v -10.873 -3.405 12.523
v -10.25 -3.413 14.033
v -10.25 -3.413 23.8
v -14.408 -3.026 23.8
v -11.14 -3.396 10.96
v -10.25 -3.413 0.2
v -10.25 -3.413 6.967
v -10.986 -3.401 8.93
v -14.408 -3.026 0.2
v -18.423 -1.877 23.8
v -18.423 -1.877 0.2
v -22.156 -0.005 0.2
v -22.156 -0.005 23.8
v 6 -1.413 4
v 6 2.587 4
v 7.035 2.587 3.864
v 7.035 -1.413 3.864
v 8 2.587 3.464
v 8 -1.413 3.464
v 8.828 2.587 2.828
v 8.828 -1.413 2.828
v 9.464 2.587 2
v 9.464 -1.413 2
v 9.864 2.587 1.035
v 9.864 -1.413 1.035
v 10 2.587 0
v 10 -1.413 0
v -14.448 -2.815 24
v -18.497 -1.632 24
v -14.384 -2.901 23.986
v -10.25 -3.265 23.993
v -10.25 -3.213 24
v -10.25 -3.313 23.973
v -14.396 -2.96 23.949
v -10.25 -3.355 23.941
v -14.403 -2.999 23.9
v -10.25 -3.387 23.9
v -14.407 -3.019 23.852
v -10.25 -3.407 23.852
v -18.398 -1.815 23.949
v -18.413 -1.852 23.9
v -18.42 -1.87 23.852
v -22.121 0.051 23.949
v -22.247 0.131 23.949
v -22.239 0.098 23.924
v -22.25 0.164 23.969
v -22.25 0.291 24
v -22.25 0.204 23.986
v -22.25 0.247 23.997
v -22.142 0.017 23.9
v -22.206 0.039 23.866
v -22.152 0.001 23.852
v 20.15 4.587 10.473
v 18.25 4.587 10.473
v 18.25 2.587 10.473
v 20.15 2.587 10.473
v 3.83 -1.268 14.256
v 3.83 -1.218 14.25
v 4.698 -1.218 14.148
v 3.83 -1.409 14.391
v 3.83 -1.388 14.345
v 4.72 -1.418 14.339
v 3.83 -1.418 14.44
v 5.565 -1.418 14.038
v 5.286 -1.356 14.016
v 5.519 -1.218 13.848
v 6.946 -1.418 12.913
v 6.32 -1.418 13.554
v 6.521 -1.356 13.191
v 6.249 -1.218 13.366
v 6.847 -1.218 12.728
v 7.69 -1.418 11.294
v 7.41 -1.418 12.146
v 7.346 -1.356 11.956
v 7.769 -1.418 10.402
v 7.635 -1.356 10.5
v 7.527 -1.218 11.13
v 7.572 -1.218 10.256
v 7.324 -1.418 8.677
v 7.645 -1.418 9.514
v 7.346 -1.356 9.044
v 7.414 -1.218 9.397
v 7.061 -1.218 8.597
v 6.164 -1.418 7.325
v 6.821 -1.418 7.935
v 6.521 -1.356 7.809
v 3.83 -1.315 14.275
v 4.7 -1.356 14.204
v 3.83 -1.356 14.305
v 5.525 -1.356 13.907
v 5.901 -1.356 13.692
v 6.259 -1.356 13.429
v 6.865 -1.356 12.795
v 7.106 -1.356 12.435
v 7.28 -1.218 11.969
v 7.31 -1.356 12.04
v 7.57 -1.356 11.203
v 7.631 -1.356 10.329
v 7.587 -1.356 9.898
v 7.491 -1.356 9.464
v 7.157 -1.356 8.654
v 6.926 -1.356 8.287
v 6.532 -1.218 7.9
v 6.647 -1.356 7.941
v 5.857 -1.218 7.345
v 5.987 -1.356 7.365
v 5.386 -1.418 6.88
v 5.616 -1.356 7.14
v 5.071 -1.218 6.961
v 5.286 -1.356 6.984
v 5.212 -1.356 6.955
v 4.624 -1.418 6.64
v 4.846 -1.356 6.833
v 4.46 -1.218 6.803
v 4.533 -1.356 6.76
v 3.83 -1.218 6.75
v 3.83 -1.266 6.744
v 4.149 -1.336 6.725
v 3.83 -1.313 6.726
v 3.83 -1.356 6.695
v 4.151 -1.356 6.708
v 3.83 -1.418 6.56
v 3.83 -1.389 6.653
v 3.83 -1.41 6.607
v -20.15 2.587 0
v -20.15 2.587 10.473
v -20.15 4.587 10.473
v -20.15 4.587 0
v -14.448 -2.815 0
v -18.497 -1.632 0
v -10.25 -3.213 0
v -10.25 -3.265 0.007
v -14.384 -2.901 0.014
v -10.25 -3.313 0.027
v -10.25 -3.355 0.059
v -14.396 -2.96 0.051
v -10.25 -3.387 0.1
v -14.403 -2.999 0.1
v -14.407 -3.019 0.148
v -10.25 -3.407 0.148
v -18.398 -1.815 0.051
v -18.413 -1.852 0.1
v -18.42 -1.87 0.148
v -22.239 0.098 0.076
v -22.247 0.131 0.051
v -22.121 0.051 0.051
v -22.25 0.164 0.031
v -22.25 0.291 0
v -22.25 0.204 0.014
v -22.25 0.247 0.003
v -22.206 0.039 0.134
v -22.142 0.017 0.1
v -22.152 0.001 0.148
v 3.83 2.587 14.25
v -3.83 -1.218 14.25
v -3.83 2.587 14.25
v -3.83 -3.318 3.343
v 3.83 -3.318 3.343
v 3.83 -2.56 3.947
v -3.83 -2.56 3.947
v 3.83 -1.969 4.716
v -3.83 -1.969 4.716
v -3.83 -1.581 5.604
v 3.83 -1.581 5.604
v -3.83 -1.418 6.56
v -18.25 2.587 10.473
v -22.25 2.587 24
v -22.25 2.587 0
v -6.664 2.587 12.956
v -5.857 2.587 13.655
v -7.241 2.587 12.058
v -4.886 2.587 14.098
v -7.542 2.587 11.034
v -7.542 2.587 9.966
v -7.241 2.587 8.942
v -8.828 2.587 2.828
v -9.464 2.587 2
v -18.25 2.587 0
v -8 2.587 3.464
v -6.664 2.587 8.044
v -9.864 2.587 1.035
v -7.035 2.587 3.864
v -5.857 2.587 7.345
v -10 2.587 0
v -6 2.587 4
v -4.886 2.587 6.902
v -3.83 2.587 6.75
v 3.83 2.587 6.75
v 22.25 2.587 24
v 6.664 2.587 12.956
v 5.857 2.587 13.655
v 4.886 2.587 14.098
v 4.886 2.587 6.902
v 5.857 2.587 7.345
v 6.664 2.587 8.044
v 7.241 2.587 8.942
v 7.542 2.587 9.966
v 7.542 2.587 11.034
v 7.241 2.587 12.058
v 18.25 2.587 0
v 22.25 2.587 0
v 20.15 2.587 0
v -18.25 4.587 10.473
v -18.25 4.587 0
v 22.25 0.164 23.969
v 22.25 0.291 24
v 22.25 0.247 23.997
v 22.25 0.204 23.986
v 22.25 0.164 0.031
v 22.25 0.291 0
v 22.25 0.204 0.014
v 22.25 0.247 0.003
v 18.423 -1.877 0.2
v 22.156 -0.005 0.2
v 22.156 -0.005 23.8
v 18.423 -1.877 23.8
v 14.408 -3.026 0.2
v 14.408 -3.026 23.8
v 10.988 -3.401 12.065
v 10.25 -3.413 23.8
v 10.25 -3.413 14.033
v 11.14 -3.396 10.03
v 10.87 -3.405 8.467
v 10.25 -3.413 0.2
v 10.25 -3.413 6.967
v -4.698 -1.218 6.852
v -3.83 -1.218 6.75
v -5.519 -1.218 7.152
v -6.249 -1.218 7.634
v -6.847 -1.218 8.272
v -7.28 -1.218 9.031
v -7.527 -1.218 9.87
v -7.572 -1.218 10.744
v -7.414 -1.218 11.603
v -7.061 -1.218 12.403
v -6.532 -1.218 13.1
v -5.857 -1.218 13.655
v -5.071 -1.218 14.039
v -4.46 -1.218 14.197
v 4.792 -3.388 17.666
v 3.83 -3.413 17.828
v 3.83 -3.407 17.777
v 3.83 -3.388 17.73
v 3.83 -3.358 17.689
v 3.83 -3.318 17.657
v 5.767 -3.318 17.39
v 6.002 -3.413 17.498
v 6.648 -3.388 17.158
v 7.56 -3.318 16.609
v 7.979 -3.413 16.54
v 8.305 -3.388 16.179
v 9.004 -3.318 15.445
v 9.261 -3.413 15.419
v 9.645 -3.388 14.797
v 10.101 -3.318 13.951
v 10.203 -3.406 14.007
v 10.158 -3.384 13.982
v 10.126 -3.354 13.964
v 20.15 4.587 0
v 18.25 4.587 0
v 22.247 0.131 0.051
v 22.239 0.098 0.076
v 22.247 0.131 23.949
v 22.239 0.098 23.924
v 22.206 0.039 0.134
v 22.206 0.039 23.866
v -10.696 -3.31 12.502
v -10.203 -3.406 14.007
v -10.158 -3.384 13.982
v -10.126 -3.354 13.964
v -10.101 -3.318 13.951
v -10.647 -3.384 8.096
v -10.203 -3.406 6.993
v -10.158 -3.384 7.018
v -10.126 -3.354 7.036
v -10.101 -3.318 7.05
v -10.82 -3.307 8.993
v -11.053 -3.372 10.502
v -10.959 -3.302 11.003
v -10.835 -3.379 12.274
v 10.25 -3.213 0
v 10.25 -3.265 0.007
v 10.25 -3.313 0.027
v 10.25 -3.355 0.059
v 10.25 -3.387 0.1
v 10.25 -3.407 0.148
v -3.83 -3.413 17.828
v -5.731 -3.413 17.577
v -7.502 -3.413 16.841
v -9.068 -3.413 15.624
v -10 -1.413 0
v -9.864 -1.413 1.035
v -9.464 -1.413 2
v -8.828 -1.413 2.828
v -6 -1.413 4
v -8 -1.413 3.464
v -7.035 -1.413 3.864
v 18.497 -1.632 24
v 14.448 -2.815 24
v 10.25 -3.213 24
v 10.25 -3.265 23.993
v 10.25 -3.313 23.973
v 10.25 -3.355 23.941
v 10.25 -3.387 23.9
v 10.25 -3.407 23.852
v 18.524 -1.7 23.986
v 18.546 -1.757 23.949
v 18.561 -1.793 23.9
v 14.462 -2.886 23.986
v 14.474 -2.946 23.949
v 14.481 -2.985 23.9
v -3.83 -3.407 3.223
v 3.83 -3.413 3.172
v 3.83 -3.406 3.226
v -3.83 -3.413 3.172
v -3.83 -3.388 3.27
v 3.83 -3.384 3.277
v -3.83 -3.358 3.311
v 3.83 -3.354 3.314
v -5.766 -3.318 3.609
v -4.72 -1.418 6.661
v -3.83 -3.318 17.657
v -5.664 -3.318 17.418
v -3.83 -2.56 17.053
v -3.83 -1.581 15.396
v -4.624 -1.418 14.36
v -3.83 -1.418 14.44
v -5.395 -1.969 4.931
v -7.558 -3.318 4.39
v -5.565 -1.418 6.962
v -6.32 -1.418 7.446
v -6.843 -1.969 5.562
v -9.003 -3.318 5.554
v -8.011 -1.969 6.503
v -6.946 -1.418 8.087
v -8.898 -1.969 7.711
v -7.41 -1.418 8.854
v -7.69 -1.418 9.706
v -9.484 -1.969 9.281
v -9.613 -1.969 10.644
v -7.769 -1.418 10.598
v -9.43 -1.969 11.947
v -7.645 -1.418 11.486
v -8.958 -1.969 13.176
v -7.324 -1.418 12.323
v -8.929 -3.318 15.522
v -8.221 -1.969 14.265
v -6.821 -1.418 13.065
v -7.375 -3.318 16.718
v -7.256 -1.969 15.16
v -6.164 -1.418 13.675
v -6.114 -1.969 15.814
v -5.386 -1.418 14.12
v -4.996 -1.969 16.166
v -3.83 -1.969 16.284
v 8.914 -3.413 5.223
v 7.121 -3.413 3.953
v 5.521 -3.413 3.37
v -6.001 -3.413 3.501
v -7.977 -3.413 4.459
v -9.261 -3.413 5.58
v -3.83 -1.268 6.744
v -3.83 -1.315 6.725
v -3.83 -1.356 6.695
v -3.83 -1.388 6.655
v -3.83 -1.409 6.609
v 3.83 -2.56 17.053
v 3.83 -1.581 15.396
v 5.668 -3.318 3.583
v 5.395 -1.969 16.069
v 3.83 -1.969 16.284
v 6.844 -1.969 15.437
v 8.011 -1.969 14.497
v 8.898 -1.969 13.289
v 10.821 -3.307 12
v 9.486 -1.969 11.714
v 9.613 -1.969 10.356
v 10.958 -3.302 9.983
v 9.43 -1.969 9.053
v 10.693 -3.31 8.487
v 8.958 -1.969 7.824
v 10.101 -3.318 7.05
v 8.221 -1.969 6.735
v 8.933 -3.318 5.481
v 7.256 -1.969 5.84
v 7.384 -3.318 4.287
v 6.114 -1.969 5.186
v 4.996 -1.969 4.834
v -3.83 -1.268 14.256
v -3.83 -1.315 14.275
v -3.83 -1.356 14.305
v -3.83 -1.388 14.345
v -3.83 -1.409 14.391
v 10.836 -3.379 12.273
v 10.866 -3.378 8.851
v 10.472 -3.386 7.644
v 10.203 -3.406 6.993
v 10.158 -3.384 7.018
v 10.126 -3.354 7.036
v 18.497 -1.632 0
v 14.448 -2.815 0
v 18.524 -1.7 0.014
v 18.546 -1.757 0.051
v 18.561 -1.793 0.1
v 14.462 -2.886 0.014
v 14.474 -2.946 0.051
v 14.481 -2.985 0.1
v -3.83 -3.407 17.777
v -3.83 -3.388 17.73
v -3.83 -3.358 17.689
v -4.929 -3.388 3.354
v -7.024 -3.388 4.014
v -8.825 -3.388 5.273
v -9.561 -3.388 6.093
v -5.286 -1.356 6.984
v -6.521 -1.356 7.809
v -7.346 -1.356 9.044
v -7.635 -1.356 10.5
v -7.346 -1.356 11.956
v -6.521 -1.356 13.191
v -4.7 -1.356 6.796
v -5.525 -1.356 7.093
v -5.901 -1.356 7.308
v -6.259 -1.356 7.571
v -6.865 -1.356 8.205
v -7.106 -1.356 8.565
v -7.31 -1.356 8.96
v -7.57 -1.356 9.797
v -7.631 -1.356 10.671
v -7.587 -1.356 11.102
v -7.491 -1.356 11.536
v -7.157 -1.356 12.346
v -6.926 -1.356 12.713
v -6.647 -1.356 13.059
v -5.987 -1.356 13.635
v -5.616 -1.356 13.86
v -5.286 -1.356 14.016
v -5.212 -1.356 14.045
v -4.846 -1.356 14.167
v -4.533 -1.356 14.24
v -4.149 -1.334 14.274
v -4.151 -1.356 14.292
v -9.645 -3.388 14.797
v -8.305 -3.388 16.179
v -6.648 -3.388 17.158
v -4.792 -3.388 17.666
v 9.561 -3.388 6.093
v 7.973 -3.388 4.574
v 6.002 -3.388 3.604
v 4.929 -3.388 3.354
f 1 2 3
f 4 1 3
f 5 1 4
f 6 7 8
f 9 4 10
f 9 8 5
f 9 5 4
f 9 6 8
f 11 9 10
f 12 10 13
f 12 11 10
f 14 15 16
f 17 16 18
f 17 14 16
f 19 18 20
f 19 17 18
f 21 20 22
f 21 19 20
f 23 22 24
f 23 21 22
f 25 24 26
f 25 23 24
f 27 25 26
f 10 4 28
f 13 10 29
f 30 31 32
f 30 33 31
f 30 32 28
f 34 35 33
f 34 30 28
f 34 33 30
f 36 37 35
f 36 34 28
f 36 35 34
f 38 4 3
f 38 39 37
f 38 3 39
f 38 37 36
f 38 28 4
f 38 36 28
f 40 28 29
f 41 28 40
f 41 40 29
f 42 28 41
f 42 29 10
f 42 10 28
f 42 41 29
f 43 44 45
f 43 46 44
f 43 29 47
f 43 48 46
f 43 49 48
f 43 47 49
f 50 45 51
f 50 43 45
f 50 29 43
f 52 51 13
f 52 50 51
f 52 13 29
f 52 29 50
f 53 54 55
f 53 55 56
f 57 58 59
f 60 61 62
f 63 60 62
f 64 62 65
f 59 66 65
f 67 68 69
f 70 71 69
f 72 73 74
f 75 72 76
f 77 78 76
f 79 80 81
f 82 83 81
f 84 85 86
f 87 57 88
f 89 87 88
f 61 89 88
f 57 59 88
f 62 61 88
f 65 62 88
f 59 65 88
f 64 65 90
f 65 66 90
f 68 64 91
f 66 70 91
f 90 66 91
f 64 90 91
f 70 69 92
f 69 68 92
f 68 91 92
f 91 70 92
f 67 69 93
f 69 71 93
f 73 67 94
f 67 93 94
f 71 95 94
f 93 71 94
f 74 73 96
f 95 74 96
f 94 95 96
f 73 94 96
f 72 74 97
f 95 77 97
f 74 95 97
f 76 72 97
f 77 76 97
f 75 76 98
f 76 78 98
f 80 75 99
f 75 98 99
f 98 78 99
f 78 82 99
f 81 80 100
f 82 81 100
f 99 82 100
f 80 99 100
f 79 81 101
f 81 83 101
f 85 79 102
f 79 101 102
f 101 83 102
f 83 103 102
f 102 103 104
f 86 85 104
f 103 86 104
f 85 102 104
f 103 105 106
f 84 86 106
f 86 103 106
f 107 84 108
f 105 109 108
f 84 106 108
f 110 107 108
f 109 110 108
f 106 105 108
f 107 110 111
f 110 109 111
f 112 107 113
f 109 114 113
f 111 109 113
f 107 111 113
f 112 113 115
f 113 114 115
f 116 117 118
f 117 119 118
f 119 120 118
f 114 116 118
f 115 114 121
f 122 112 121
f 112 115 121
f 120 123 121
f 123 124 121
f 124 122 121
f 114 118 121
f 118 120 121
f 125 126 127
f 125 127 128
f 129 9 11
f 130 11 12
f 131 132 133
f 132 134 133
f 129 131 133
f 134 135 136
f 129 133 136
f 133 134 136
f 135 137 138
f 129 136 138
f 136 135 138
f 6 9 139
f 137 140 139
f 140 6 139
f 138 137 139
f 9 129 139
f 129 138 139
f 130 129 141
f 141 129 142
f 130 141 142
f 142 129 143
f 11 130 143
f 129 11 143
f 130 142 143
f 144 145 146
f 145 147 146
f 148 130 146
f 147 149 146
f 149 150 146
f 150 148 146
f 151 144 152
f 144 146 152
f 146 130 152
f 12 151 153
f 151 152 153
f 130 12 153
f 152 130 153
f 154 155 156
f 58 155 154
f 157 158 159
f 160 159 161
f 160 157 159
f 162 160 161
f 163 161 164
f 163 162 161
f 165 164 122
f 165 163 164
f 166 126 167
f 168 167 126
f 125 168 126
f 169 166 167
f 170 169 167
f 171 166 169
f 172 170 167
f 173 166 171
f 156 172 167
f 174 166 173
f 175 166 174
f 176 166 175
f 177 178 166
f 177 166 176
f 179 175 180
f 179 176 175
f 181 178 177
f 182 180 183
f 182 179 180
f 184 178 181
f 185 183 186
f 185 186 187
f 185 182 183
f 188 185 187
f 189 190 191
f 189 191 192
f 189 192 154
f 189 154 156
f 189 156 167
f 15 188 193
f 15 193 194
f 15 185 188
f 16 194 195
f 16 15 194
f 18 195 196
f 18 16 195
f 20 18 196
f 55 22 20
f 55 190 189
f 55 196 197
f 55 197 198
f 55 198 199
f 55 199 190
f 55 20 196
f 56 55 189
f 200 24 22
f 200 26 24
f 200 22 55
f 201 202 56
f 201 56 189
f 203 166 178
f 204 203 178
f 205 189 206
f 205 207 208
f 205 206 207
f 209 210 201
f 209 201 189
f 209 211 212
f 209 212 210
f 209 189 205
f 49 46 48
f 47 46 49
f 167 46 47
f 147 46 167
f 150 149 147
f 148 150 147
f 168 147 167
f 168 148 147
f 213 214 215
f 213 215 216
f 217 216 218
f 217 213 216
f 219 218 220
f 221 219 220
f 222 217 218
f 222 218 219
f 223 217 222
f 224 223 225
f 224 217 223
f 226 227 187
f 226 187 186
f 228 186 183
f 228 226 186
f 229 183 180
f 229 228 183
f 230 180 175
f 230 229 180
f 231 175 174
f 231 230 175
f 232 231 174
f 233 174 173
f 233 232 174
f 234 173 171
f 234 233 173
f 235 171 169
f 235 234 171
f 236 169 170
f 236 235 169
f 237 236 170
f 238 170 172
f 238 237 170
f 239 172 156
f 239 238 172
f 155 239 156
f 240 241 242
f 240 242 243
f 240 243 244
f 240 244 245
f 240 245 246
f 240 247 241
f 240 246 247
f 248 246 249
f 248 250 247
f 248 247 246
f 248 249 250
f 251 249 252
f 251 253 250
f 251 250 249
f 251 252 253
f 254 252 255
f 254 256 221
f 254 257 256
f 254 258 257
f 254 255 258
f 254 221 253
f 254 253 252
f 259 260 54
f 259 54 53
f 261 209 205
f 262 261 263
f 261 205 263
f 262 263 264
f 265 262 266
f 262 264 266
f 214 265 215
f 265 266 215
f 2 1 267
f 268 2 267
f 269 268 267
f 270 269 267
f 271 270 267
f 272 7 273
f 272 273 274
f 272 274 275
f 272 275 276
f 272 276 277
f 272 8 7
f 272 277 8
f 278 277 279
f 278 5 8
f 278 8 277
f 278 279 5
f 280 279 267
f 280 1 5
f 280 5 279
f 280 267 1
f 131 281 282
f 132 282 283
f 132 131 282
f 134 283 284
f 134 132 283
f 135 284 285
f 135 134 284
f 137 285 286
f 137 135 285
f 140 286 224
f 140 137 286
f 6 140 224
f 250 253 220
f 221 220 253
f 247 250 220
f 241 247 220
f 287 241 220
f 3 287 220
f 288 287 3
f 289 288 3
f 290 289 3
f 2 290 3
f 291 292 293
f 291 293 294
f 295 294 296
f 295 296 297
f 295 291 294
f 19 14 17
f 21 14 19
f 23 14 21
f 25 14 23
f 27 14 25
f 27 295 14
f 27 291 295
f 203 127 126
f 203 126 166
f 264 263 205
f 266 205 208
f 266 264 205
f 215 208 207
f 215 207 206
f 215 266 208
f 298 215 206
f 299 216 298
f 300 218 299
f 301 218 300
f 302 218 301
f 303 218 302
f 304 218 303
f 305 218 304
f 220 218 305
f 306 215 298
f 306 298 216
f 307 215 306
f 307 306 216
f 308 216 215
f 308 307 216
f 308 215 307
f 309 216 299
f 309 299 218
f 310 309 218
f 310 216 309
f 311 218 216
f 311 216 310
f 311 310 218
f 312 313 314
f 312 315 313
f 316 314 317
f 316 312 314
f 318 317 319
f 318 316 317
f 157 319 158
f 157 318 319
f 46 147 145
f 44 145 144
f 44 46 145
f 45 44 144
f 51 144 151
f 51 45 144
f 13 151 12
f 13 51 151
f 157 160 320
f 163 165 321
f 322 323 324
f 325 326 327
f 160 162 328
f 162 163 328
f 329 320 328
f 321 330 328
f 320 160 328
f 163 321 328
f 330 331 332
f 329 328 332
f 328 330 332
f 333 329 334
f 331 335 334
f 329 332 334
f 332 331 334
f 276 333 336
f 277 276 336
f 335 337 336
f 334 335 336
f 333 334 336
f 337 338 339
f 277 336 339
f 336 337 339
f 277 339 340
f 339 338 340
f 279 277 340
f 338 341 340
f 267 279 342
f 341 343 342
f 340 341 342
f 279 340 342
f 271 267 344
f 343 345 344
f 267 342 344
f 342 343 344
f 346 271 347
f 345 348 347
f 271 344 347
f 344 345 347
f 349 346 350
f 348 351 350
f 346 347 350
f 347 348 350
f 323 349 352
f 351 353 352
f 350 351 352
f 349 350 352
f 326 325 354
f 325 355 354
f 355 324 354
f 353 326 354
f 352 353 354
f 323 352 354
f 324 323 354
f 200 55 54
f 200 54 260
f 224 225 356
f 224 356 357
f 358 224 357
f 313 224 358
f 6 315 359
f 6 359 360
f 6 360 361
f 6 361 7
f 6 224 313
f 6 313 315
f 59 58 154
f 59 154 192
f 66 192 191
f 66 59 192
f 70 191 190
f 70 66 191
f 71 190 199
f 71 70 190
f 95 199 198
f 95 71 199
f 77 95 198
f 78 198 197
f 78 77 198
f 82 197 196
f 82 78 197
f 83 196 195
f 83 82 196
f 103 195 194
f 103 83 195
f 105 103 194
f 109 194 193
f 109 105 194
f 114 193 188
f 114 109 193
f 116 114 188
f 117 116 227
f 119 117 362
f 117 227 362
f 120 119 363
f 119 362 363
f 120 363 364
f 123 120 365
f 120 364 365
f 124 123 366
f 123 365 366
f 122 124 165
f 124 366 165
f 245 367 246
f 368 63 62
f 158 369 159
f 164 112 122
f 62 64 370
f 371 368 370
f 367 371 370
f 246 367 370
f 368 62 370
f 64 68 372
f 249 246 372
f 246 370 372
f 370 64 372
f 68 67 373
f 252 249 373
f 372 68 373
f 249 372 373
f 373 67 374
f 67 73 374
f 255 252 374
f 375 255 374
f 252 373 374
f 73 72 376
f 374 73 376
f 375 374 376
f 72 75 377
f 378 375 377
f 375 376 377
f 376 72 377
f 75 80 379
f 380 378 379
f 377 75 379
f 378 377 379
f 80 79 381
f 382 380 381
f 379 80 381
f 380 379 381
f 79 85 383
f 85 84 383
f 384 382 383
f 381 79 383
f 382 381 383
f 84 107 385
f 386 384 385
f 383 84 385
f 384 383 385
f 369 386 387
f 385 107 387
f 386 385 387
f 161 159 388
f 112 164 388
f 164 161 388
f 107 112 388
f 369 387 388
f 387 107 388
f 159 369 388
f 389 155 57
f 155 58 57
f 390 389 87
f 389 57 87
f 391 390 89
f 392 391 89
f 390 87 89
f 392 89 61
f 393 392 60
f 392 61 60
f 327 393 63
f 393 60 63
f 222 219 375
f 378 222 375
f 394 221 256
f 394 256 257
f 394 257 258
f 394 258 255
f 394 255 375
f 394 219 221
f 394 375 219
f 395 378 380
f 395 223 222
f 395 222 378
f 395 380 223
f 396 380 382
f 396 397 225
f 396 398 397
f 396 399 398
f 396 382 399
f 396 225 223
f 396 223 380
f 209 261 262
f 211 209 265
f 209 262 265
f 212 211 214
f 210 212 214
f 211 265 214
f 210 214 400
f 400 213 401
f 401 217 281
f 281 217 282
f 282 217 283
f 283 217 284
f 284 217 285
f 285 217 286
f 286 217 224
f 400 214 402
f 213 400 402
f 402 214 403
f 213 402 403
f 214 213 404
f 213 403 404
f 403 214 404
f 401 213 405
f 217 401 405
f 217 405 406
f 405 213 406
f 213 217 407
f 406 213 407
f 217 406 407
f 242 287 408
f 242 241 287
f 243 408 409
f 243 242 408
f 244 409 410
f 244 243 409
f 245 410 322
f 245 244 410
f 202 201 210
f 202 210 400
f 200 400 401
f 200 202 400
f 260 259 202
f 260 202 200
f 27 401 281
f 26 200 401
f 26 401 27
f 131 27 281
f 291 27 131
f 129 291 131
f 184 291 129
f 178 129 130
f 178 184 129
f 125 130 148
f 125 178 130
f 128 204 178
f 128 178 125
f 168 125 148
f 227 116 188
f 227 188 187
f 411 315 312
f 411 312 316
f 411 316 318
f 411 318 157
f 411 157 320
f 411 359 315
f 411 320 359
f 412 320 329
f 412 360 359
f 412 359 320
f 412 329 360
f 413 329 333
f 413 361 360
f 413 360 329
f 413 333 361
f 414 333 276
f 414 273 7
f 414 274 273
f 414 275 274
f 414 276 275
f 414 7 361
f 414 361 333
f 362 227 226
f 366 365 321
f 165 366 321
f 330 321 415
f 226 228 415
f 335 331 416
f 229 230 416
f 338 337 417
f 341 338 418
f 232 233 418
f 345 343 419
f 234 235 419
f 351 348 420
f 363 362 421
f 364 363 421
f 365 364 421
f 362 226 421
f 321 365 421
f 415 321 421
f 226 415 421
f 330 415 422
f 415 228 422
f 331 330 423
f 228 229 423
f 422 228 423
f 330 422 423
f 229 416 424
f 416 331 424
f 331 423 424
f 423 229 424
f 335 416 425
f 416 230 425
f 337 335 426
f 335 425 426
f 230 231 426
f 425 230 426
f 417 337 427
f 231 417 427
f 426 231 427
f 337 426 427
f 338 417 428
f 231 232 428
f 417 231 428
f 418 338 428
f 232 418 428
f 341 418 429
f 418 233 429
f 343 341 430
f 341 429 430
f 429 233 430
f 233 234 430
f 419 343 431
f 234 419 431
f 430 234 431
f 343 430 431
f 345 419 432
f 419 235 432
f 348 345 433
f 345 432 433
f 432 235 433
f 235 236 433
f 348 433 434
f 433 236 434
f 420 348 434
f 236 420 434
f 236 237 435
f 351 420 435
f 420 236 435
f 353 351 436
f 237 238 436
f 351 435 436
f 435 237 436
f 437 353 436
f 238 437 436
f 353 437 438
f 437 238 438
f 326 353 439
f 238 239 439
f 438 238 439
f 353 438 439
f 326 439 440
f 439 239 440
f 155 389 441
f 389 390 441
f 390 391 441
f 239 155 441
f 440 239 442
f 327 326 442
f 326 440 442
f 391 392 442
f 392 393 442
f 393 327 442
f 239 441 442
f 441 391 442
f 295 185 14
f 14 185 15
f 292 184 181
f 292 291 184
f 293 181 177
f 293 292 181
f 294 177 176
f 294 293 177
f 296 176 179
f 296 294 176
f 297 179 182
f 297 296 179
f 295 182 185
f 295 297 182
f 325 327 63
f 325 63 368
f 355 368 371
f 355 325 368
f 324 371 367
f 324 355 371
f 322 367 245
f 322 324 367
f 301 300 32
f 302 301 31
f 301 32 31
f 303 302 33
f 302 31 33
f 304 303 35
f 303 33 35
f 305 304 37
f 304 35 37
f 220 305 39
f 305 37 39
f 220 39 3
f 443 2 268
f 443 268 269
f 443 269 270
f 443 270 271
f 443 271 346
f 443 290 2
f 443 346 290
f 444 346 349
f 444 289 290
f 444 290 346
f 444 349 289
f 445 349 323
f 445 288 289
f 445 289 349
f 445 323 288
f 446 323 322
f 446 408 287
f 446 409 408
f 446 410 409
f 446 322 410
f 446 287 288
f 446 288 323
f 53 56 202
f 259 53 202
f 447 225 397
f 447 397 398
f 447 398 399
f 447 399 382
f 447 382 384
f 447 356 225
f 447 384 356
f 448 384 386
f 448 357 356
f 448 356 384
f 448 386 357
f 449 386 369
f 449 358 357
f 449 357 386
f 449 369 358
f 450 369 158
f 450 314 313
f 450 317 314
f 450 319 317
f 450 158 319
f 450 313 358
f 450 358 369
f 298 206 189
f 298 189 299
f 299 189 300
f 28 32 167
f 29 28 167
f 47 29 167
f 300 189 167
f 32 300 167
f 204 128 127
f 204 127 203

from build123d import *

# Parameters (mm, degrees)
EXTRUDE_1_DEPTH     = 24
SKETCH_2_W          = 20
SKETCH_2_H          = 4
CUT_EXTRUDE_1_DEPTH = 4
SKETCH_3_W          = 1.9
SKETCH_3_H          = 10.472908188
EXTRUDE_2_DEPTH     = 2
FILLET_1_R          = 4
CUT_EXTRUDE_2_DEPTH = 34.690688625
SWEEP_START         = -3.83
SWEEP_4_3_DEPTH     = 7.66
FILLET_2_R          = 0.2
FILLET_3_R          = 0.2


with BuildPart() as part:
    # Эскиз1 → Бобышка-Вытянуть1 (new body)
    with BuildSketch(Plane.XY):
        with BuildLine():
            Line((-20.25, 2.586649223), (20.25, 2.586649223))
            Line((20.25, 2.586649223), (22.25, 2.586649223))
            Line((22.25, 2.586649223), (22.25, 0.053782912))
            ThreePointArc((22.25, 0.053782912), (16.495418641, -2.529195567), (10.25, -3.413350777))
            Line((10.25, -3.413350777), (-10.25, -3.413350777))
            ThreePointArc((-10.25, -3.413350777), (-16.495418641, -2.529195567), (-22.25, 0.053782912))
            Line((-22.25, 0.053782912), (-22.25, 2.586649223))
            Line((-22.25, 2.586649223), (-20.25, 2.586649223))
        make_face()
    extrude(amount=EXTRUDE_1_DEPTH)

    # Эскиз2 → Вырез-Вытянуть1 (cut)
    with BuildSketch(Plane(origin=(0, 2.586649223, 0), x_dir=(1, 0, 0), z_dir=(0, 1, 0))):
        with Locations((0, -2)):
            Rectangle(SKETCH_2_W, SKETCH_2_H)
    extrude(amount=-CUT_EXTRUDE_1_DEPTH, mode=Mode.SUBTRACT)

    # Эскиз3 → Бобышка-Вытянуть2 (add)
    with BuildSketch(Plane(origin=(0, 2.586649223, 0), x_dir=(1, 0, 0), z_dir=(0, 1, 0))):
        with Locations((19.2, -5.236454094)):
            Rectangle(SKETCH_3_W, SKETCH_3_H)
        with Locations((-19.2, -5.236454094)):
            Rectangle(SKETCH_3_W, SKETCH_3_H)
    extrude(amount=EXTRUDE_2_DEPTH)

    # Скругление1
    fillet_1_edges = [part.edges().sort_by_distance(p)[0] for p in [
        (-10, 0.586649223, 4),
        (10, 0.586649223, 4),
    ]]
    fillet(fillet_1_edges, radius=FILLET_1_R - 0.0001)  # a hair under: the kernel refuses the full size

    # Эскиз4 → Вырез-Вытянуть2 (cut, through all)
    with BuildSketch(Plane.XZ.offset(3.413350777)):
        with BuildLine():
            Line((-3.83, 14.25), (3.83, 14.25))
            ThreePointArc((3.83, 14.25), (7.58, 10.5), (3.83, 6.75))
            Line((3.83, 6.75), (-3.83, 6.75))
            ThreePointArc((-3.83, 6.75), (-7.58, 10.5), (-3.83, 14.25))
        make_face()
    extrude(amount=-CUT_EXTRUDE_2_DEPTH, mode=Mode.SUBTRACT)

    # Вырез-По траектории4: read off the stored shape, not the designer's step
    # Вырез-По траектории4 outline → Вырез-По траектории4 (revolve, cut)
    with BuildSketch(Plane(origin=(3.83, 0, 10.5), x_dir=(1, 0, 0), z_dir=(0, 0, 1))):
        with BuildLine():
            Line((3.75, -3.413351016), (7.214101753, -3.413351016))
            ThreePointArc((7.214101753, -3.413351016), (5.750000119, -1.949249231), (3.75, -1.413350777))
            Line((3.75, -1.413350777), (3.75, -3.413351016))
        make_face()
    revolve(axis=Axis((3.83, 0, 10.5), (0, 1, 0)), mode=Mode.SUBTRACT)

    # Sweep 4 2 outline → Sweep 4 2 (revolve, cut)
    with BuildSketch(Plane(origin=(-3.83, 0, 10.5), x_dir=(1, 0, 0), z_dir=(0, 0, 1))):
        with BuildLine():
            Line((3.75, -3.413350777), (7.214101615, -3.413350777))
            ThreePointArc((7.214101615, -3.413350777), (5.75, -1.949249162), (3.75, -1.413350777))
            Line((3.75, -1.413350777), (3.75, -3.413350777))
        make_face()
    revolve(axis=Axis((-3.83, 0, 10.5), (0, 1, 0)), mode=Mode.SUBTRACT)

    # Sweep 4 3 outline → Sweep 4 3 (cut)
    with BuildSketch(Plane.YZ.offset(SWEEP_START)):
        with BuildLine():
            ThreePointArc((-1.413350777, 14.25), (-1.949249162, 16.25), (-3.413350777, 17.714101615))
            Line((-3.413350777, 17.714101615), (-3.413350777, 3.285898385))
            ThreePointArc((-3.413350777, 3.285898385), (-1.949249162, 4.75), (-1.413350777, 6.75))
            Line((-1.413350777, 6.75), (-1.413350777, 14.25))
        make_face()
    extrude(amount=SWEEP_4_3_DEPTH, mode=Mode.SUBTRACT)

    # Скругление2
    fillet_2_edges = [part.edges().sort_by_distance(p)[0] for p in [
        (0, -1.413350777, 14.25),
        (0, -1.413350777, 6.75),
        (-7.58, -1.413350777, 10.5),
        (-11.036133766, -3.39961311, 10.500000042),
        (-7.592036663, -3.413350777, 16.65551316),
        (-7.592036663, -3.413350777, 4.34448684),
        (0, -3.413350777, 3.285898385),
        (6.481650429, -1.413350777, 13.151650429),
        (7.59203662, -3.413351016, 16.655513348),
        (10.838298925, -3.40565846, 12.191976989),
        (7.59203662, -3.413351016, 4.344486652),
        (0, -3.413350777, 17.714101615),
    ]]
    fillet(fillet_2_edges, radius=FILLET_2_R)

    # Скругление3
    fillet_3_edges = [part.edges().sort_by_distance(p)[0] for p in [
        (-16.495418641, -2.529195567, 24),
        (0, -3.413350777, 24),
        (22.25, 0.053782912, 12),
        (-22.25, 0.053782912, 12),
        (16.495418641, -2.529195567, 24),
        (16.495418641, -2.529195567, 0),
        (0, -3.413350777, 0),
        (-16.495418641, -2.529195567, 0),
    ]]
    fillet(fillet_3_edges, radius=FILLET_3_R)


solid = part.part
